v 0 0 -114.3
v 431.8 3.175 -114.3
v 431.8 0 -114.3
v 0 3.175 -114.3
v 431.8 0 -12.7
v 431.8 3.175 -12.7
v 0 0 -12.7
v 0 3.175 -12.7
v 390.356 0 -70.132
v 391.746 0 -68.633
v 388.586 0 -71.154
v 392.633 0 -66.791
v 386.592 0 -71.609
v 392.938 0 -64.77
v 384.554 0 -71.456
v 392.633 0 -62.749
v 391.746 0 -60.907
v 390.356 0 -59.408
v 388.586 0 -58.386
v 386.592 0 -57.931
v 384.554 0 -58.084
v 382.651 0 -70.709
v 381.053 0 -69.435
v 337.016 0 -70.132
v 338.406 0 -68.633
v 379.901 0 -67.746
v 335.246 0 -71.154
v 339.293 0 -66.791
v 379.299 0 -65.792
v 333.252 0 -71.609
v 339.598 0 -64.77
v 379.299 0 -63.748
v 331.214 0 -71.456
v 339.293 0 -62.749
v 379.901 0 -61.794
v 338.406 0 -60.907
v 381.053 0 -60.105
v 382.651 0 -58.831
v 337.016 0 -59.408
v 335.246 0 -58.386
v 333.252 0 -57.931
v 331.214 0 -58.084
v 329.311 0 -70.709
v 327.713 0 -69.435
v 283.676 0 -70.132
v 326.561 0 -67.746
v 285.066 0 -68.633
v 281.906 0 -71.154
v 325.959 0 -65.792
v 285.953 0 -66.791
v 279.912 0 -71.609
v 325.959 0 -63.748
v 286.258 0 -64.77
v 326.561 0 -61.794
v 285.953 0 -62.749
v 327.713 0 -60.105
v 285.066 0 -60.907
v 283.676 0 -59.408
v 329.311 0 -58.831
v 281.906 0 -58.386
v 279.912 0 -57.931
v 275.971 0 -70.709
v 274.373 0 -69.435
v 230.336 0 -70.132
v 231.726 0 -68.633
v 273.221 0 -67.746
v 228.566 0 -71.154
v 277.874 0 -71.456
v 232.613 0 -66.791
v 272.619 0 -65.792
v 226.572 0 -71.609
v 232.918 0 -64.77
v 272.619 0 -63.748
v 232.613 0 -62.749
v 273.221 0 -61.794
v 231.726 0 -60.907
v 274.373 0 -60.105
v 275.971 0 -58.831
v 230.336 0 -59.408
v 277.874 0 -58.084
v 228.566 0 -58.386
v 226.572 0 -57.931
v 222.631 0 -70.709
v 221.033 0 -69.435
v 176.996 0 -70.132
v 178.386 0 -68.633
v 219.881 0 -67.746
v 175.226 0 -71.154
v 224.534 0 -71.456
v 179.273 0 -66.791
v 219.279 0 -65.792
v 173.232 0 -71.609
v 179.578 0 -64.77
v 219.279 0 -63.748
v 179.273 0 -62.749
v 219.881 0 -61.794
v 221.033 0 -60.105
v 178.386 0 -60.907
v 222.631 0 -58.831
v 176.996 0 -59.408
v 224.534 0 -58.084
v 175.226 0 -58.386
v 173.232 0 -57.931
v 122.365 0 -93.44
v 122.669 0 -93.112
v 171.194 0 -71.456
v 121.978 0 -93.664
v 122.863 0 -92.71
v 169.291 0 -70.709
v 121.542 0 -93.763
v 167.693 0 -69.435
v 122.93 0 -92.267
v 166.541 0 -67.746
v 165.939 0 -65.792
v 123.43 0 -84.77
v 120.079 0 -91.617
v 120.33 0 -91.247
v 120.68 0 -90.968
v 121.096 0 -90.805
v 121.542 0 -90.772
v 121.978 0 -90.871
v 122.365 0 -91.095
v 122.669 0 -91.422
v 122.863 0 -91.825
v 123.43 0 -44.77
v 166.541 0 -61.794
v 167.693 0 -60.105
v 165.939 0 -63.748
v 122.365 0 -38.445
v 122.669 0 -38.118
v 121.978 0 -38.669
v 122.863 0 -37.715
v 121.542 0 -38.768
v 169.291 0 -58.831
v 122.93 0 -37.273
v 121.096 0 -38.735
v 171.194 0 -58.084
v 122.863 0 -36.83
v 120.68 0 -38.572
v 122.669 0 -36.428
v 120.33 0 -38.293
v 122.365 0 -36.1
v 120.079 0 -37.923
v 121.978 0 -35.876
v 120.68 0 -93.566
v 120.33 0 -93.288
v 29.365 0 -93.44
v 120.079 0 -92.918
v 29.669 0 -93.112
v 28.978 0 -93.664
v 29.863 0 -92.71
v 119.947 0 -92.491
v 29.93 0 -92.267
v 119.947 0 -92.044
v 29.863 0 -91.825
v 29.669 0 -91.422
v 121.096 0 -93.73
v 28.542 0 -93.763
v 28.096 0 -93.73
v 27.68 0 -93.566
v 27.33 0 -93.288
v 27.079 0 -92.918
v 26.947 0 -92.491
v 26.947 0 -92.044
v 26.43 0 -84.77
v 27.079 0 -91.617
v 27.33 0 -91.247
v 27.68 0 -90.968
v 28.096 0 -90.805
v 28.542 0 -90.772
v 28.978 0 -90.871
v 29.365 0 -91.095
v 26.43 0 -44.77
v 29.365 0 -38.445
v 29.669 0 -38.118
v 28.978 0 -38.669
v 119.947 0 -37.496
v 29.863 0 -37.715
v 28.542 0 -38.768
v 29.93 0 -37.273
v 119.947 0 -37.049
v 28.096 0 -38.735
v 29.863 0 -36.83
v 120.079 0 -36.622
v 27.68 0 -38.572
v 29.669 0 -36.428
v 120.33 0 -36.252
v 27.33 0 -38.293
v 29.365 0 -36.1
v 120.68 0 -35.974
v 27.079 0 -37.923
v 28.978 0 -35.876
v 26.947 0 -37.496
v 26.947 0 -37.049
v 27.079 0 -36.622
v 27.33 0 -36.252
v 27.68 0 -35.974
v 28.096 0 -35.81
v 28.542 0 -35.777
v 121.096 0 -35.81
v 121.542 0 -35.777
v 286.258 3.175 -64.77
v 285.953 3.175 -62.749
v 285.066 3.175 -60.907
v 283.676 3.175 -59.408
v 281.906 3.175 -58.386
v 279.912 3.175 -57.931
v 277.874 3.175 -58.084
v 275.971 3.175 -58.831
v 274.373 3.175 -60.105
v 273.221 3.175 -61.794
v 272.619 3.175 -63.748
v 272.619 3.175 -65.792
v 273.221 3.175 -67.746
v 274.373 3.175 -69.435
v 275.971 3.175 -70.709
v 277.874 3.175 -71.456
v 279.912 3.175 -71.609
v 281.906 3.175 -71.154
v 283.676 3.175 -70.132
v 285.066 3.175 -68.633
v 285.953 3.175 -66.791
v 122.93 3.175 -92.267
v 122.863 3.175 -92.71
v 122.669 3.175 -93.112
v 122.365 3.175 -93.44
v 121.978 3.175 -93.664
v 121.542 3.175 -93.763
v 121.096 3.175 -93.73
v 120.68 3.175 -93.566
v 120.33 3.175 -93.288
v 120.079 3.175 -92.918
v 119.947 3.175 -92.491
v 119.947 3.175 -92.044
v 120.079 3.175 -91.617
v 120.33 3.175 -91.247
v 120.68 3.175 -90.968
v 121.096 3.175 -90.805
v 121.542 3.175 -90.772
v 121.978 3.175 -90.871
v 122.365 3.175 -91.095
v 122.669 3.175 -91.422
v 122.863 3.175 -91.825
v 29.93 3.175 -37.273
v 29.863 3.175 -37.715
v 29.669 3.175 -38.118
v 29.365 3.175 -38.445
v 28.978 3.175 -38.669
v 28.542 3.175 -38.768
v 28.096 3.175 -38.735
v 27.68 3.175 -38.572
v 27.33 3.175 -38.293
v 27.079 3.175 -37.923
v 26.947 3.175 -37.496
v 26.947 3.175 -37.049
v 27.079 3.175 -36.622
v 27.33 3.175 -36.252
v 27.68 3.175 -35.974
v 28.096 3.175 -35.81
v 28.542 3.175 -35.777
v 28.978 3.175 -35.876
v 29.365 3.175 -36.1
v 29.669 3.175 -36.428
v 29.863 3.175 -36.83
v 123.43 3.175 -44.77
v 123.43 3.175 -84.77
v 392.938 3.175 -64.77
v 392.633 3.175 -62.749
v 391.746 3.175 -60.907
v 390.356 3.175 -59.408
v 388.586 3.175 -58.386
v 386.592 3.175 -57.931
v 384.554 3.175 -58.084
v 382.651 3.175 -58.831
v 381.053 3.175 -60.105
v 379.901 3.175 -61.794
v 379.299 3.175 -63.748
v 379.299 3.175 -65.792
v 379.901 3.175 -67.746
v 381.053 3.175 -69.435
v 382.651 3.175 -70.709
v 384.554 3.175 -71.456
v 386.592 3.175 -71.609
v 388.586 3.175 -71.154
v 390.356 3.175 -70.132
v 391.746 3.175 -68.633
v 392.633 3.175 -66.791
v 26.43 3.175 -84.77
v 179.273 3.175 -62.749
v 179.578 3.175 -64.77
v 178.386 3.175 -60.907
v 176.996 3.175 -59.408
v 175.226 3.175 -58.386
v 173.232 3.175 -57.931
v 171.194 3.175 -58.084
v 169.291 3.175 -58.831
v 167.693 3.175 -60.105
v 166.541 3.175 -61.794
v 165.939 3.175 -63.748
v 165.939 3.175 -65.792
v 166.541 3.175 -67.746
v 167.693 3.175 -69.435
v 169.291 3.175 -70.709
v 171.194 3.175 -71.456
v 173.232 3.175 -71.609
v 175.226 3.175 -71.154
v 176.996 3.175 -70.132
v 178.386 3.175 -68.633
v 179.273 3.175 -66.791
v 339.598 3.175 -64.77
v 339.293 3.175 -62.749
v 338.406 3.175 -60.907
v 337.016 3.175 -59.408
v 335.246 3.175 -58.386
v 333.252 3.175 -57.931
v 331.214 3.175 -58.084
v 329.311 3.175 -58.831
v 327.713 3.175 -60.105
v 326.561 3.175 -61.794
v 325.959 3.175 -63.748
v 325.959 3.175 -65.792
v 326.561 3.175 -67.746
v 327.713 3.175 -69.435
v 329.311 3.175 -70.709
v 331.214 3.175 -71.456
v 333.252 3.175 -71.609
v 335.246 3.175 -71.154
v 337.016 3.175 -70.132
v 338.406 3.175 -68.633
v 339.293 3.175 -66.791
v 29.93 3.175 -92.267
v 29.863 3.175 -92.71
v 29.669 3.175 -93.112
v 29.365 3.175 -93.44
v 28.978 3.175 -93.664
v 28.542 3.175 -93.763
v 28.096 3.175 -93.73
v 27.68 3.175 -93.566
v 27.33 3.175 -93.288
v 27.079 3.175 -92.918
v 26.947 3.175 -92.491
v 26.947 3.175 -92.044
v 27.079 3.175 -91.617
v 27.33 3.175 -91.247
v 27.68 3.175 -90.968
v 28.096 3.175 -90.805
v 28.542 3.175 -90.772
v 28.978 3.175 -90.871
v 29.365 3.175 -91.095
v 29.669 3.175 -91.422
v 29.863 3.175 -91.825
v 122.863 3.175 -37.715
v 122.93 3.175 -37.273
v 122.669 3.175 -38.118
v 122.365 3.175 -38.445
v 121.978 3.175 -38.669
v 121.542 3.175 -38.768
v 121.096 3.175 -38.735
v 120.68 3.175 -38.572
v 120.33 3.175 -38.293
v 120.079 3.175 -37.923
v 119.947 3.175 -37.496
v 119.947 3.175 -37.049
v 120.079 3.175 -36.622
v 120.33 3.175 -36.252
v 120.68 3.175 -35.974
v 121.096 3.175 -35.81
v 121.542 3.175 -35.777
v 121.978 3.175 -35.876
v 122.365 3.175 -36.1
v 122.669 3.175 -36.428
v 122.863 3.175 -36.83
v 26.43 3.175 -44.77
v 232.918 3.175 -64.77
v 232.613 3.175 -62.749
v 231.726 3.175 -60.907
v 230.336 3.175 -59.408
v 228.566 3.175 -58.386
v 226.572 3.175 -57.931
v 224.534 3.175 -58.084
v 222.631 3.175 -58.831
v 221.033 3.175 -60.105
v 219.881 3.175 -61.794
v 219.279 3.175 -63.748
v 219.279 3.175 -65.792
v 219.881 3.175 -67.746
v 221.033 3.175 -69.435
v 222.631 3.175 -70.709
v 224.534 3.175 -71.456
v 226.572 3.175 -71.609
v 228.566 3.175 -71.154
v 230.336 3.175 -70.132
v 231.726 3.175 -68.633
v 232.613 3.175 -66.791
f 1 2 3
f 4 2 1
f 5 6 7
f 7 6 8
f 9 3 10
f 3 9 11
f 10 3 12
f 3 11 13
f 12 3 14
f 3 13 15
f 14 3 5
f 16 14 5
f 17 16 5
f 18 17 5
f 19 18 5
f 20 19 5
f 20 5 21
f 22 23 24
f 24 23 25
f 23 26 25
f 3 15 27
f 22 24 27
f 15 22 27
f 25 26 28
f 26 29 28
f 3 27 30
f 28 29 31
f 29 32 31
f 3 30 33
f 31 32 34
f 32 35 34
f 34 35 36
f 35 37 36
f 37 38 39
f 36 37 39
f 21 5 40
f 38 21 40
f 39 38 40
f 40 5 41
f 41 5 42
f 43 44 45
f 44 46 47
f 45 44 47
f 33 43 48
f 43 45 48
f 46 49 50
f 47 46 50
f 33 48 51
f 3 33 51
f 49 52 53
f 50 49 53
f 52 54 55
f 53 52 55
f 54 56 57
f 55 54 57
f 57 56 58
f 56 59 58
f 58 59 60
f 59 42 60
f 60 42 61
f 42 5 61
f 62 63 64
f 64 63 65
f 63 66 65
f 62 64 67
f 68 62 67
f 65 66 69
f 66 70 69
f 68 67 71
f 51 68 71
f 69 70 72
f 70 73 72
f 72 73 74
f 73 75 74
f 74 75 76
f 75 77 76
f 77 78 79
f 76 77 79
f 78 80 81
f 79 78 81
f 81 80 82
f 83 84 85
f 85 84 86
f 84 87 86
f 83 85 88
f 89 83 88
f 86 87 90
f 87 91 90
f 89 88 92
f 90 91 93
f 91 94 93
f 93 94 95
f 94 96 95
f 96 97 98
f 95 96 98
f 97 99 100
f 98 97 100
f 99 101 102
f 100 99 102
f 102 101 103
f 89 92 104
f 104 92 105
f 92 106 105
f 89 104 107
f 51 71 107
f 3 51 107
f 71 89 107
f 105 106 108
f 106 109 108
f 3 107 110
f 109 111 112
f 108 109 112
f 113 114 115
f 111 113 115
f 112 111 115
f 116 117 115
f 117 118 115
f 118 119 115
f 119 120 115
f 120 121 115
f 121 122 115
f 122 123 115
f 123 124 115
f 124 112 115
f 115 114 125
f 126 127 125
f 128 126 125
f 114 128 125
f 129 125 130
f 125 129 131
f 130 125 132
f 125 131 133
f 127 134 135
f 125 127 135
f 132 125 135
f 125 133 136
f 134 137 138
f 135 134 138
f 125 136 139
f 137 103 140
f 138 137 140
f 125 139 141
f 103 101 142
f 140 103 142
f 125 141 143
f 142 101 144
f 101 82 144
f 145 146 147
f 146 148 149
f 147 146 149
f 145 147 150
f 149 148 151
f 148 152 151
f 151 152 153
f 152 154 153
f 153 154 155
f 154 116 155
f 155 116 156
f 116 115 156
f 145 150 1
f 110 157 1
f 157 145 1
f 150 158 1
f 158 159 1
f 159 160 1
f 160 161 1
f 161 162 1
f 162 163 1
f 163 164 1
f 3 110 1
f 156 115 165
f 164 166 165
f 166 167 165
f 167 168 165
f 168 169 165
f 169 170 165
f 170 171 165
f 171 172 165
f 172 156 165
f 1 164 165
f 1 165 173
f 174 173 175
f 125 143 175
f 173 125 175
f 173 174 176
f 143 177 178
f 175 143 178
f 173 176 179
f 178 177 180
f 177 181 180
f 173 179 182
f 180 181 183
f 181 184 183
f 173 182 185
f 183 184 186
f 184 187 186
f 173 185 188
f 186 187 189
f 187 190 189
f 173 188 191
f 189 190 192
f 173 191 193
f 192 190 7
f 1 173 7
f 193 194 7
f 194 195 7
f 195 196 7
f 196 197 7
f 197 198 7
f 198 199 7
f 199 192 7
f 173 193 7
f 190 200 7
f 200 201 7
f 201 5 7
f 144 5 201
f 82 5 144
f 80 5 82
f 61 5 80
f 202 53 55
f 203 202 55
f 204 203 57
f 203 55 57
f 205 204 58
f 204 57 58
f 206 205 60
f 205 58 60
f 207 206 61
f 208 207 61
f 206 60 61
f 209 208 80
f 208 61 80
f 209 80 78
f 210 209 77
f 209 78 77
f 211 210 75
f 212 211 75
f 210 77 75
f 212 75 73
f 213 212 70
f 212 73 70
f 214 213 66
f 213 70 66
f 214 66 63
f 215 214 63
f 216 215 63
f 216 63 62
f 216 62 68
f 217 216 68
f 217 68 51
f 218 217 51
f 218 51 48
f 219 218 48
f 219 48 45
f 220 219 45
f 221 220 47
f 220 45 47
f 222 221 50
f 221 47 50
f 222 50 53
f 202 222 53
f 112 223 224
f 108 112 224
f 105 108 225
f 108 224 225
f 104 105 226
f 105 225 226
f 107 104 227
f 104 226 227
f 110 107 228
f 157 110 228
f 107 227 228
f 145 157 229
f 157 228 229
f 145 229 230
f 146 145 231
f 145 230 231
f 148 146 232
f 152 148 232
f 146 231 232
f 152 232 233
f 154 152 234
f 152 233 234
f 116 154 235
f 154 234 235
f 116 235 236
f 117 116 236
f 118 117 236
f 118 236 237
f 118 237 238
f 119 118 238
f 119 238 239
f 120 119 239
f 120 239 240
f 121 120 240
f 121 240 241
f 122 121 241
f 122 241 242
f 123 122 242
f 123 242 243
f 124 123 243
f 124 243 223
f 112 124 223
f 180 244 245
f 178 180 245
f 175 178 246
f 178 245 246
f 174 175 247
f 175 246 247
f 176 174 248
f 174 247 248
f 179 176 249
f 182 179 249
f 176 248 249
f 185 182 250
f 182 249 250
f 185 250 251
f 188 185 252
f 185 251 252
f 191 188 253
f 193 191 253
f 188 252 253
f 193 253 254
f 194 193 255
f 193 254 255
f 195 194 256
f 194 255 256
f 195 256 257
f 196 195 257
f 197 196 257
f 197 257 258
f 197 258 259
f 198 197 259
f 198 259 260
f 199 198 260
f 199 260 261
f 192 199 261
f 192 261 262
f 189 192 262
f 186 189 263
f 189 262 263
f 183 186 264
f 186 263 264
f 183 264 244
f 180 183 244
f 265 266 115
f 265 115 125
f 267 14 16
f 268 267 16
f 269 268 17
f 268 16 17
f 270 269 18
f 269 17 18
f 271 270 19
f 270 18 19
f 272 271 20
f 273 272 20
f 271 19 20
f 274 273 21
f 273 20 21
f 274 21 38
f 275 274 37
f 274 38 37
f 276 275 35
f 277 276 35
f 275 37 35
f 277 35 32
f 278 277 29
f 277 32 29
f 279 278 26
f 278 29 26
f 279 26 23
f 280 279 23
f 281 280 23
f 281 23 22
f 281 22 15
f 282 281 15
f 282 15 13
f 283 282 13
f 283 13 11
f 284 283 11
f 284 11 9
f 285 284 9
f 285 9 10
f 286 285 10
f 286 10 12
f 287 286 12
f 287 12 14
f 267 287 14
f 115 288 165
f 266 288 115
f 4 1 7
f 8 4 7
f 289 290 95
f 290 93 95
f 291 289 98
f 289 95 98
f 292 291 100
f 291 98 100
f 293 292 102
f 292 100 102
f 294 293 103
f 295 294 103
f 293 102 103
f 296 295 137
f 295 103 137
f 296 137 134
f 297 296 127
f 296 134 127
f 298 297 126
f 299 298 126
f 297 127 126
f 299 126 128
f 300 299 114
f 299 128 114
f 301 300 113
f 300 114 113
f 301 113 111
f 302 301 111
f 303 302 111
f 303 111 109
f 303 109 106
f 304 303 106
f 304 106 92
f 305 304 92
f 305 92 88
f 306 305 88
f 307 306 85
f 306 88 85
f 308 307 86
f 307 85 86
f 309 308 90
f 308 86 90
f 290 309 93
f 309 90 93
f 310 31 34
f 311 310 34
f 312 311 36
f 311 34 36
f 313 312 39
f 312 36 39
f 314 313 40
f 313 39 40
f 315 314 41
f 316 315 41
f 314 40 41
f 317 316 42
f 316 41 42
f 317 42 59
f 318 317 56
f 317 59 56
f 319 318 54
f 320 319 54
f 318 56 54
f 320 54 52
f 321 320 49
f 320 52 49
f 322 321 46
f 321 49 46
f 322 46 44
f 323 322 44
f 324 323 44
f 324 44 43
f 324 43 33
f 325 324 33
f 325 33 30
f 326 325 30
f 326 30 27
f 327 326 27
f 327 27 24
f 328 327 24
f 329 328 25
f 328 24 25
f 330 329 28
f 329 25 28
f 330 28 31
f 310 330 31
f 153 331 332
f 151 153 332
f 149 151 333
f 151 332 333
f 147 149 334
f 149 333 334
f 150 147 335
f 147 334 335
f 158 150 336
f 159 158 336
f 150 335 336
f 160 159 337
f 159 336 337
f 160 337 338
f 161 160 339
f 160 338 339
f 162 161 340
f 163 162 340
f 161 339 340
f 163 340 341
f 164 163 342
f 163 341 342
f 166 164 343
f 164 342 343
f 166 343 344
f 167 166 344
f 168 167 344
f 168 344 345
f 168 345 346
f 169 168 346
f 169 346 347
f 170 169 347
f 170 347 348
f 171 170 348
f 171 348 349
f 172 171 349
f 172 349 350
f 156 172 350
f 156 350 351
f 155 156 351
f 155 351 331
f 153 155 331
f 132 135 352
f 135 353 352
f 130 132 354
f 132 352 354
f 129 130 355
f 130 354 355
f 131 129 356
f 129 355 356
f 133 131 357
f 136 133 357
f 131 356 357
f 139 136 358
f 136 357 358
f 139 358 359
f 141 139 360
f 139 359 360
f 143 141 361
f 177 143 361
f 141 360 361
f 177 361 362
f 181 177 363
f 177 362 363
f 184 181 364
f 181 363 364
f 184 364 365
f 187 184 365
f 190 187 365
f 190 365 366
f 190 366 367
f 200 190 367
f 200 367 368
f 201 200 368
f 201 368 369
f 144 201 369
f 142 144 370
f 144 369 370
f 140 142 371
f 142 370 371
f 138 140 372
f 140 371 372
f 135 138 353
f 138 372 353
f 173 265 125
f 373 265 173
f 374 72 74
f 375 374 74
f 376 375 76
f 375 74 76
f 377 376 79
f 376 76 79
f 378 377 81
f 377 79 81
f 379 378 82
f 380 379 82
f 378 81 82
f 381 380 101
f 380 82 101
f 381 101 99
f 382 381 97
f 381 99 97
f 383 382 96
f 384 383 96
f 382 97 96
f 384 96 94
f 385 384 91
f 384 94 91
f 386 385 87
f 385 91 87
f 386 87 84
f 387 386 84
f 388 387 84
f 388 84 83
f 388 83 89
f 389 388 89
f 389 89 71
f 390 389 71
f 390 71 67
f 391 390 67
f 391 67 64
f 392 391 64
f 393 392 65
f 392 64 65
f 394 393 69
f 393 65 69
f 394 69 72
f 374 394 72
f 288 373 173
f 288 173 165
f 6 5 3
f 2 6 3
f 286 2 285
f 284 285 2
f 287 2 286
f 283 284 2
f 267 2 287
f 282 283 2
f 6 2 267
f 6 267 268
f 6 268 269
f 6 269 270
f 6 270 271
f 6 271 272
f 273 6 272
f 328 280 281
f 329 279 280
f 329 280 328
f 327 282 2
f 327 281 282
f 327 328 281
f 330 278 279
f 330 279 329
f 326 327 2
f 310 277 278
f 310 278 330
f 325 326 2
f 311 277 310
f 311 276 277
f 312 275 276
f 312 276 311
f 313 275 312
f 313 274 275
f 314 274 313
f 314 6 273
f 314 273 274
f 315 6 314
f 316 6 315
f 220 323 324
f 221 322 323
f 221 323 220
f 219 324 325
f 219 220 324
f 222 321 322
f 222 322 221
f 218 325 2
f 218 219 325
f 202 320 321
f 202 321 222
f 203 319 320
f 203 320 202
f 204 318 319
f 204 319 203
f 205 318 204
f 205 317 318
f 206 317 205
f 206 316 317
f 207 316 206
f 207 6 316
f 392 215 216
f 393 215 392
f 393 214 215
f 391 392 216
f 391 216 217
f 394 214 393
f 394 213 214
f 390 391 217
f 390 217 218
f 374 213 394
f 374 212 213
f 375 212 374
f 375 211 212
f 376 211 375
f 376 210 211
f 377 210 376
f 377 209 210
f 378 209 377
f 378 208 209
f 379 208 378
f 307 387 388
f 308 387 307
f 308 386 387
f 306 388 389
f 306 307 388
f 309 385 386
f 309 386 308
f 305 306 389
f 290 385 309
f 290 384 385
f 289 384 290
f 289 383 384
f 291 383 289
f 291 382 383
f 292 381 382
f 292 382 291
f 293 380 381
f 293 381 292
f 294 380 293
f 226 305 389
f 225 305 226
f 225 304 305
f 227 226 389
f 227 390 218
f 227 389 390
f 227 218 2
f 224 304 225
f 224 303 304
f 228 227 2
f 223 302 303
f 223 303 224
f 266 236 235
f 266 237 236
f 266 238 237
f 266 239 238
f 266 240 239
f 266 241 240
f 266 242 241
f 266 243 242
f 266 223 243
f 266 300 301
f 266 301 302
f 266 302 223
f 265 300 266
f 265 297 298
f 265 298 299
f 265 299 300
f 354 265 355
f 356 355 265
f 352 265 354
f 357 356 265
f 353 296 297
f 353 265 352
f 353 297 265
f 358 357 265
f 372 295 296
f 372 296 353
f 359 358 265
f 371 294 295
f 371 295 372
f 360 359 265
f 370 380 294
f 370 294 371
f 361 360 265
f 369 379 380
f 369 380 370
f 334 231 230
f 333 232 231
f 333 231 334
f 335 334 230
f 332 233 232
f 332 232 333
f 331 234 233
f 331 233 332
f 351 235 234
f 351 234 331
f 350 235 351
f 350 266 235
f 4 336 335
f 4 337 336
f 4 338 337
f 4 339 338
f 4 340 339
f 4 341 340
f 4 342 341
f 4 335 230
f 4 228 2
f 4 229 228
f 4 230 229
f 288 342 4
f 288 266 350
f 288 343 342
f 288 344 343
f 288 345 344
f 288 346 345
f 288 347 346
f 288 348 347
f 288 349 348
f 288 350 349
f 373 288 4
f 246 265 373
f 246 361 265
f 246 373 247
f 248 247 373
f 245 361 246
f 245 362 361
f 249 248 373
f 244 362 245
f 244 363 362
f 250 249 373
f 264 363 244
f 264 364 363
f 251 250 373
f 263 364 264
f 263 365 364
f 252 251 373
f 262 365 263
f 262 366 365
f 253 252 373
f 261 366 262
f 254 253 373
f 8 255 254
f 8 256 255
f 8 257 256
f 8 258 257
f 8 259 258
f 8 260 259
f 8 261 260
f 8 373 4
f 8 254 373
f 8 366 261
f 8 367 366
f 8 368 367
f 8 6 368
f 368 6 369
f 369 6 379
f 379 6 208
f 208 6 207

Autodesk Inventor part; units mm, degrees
ref_plane "YZ Plane" through (0, 0, 0) normal (1, 0, 0) x (0, 1, 0)
ref_plane "XZ Plane" through (0, 0, 0) normal (0, 1, 0) x (-1, 0, 0)
ref_plane "XY Plane" through (0, 0, 0) normal (0, 0, 1) x (1, 0, 0)
sketch "Sketch1" plane through (0, 0, 0) normal (0, 1, 0) x (-1, 0, 0)
  line L0 (0, 0) -> (-431.8, 0)
  line L1 (-431.8, 0) -> (-431.8, -431.8)
  line L2 (-431.8, -431.8) -> (0, -431.8)
  line L3 (0, -431.8) -> (0, 0)
  dimension "d0" = 431.8
  dimension "d1" = 431.8
extrude "Extrusion1" add sketch "Sketch1" along normal blind 3.175
sketch "Sketch2" plane through (0, 3.175, 0) normal (0, 1, 0) x (1, 0, 0)
  line L0 (0, 431.8) -> (0, 0) projected
  line L1 (431.8, 0) -> (431.8, 431.8) projected
  circle A0 centre (386.08, 64.77) radius 6.35
  circle A1 centre (332.74, 64.77) radius 6.35
  circle A2 centre (279.4, 64.77) radius 6.35
  circle A3 centre (226.06, 64.77) radius 6.35
  circle A4 centre (172.72, 64.77) radius 6.35
  circle A5 centre (28.43, 92.2674) radius 1.5
  circle A6 centre (121.43, 92.2674) radius 1.5
  circle A7 centre (28.43, 37.2726) radius 1.5
  circle A8 centre (121.43, 37.2726) radius 1.5
  line L2 (26.43, 84.77) -> (123.43, 84.77)
  line L3 (123.43, 84.77) -> (123.43, 44.77)
  line L4 (123.43, 44.77) -> (26.43, 44.77)
  line L5 (26.43, 44.77) -> (26.43, 84.77)
  dimension "d14" = 12.7
  dimension "d15" = 12.7
  dimension "d16" = 12.7
  dimension "d17" = 12.7
  dimension "d18" = 12.7
extrude "Extrusion2" cut sketch "Sketch2" against normal blind 25.4
sketch "Sketch3" plane through (0, 3.175, 0) normal (0, 1, 0) x (1, 0, 0)
  line L0 (0, 431.8) -> (0, 0) projected
  line L1 (431.8, 0) -> (431.8, 431.8) projected
  circle A0 centre (88.9, 424.18) radius 2.54
  circle A1 centre (115.316, 424.18) radius 2.54
  circle A2 centre (316.484, 424.18) radius 2.54
  circle A3 centre (342.9, 424.18) radius 2.54
  line L2 (431.8, 431.8) -> (431.8, 424.18)
extrude "Extrusion3" cut sketch "Sketch3" along normal blind 25.4 and the other way blind 12.7
sketch "Sketch4" plane through (0, 0, 0) normal (0, -1, 0) x (1, 0, 0)
  circle A0 centre (386.08, -64.77) radius 6.35 projected
  circle A1 centre (386.08, -64.77) radius 6.858
  circle A2 centre (172.72, -64.77) radius 6.35 projected
  circle A3 centre (172.72, -64.77) radius 6.858
  circle A4 centre (226.06, -64.77) radius 6.35 projected
  circle A5 centre (226.06, -64.77) radius 6.858
  circle A6 centre (279.4, -64.77) radius 6.35 projected
  circle A7 centre (279.4, -64.77) radius 6.858
  circle A8 centre (332.74, -64.77) radius 6.35 projected
  circle A9 centre (332.74, -64.77) radius 6.858
  point P0 (0, 0)
  dimension "d50" = 13.716
  dimension "d51" = 13.716
  dimension "d52" = 13.716
  dimension "d53" = 13.716
  dimension "d54" = 13.716
extrude "Extrusion4" cut sketch "Sketch4" against normal blind 4.351 contours A0 | A1 | A2 | A3 | A4 | A5 | A6 | A7 | A8 | A9
sketch "Sketch6" plane through (0, 3.175, 0) normal (0, 1, 0) x (1, 0, 0)
  line L0 (431.8, 0) -> (431.8, 431.8) projected
  line L1 (0, 431.8) -> (431.8, 431.8)
  line L2 (431.8, 431.8) -> (431.8, 114.3)
  line L3 (431.8, 114.3) -> (0, 114.3)
  line L4 (0, 114.3) -> (0, 431.8)
  line L5 (0, 114.3) -> (431.8, 114.3)
  line L6 (431.8, 114.3) -> (431.8, 12.7)
  line L7 (431.8, 12.7) -> (0, 12.7)
  line L8 (0, 12.7) -> (0, 114.3)
  line L9 (431.8, 0) -> (0, 0)
  line L10 (0, 0) -> (0, 12.7)
  line L11 (0, 12.7) -> (431.8, 12.7)
  line L12 (431.8, 12.7) -> (431.8, 0)
  dimension "d68" = 317.5
  dimension "d69" = 101.6
extrude "Extrusion6" cut sketch "Sketch6" against normal blind 25.4 contours L9 L10 L7 L0 | L3 L4 L1 L0
properties part number "220307 Lid Part B"
